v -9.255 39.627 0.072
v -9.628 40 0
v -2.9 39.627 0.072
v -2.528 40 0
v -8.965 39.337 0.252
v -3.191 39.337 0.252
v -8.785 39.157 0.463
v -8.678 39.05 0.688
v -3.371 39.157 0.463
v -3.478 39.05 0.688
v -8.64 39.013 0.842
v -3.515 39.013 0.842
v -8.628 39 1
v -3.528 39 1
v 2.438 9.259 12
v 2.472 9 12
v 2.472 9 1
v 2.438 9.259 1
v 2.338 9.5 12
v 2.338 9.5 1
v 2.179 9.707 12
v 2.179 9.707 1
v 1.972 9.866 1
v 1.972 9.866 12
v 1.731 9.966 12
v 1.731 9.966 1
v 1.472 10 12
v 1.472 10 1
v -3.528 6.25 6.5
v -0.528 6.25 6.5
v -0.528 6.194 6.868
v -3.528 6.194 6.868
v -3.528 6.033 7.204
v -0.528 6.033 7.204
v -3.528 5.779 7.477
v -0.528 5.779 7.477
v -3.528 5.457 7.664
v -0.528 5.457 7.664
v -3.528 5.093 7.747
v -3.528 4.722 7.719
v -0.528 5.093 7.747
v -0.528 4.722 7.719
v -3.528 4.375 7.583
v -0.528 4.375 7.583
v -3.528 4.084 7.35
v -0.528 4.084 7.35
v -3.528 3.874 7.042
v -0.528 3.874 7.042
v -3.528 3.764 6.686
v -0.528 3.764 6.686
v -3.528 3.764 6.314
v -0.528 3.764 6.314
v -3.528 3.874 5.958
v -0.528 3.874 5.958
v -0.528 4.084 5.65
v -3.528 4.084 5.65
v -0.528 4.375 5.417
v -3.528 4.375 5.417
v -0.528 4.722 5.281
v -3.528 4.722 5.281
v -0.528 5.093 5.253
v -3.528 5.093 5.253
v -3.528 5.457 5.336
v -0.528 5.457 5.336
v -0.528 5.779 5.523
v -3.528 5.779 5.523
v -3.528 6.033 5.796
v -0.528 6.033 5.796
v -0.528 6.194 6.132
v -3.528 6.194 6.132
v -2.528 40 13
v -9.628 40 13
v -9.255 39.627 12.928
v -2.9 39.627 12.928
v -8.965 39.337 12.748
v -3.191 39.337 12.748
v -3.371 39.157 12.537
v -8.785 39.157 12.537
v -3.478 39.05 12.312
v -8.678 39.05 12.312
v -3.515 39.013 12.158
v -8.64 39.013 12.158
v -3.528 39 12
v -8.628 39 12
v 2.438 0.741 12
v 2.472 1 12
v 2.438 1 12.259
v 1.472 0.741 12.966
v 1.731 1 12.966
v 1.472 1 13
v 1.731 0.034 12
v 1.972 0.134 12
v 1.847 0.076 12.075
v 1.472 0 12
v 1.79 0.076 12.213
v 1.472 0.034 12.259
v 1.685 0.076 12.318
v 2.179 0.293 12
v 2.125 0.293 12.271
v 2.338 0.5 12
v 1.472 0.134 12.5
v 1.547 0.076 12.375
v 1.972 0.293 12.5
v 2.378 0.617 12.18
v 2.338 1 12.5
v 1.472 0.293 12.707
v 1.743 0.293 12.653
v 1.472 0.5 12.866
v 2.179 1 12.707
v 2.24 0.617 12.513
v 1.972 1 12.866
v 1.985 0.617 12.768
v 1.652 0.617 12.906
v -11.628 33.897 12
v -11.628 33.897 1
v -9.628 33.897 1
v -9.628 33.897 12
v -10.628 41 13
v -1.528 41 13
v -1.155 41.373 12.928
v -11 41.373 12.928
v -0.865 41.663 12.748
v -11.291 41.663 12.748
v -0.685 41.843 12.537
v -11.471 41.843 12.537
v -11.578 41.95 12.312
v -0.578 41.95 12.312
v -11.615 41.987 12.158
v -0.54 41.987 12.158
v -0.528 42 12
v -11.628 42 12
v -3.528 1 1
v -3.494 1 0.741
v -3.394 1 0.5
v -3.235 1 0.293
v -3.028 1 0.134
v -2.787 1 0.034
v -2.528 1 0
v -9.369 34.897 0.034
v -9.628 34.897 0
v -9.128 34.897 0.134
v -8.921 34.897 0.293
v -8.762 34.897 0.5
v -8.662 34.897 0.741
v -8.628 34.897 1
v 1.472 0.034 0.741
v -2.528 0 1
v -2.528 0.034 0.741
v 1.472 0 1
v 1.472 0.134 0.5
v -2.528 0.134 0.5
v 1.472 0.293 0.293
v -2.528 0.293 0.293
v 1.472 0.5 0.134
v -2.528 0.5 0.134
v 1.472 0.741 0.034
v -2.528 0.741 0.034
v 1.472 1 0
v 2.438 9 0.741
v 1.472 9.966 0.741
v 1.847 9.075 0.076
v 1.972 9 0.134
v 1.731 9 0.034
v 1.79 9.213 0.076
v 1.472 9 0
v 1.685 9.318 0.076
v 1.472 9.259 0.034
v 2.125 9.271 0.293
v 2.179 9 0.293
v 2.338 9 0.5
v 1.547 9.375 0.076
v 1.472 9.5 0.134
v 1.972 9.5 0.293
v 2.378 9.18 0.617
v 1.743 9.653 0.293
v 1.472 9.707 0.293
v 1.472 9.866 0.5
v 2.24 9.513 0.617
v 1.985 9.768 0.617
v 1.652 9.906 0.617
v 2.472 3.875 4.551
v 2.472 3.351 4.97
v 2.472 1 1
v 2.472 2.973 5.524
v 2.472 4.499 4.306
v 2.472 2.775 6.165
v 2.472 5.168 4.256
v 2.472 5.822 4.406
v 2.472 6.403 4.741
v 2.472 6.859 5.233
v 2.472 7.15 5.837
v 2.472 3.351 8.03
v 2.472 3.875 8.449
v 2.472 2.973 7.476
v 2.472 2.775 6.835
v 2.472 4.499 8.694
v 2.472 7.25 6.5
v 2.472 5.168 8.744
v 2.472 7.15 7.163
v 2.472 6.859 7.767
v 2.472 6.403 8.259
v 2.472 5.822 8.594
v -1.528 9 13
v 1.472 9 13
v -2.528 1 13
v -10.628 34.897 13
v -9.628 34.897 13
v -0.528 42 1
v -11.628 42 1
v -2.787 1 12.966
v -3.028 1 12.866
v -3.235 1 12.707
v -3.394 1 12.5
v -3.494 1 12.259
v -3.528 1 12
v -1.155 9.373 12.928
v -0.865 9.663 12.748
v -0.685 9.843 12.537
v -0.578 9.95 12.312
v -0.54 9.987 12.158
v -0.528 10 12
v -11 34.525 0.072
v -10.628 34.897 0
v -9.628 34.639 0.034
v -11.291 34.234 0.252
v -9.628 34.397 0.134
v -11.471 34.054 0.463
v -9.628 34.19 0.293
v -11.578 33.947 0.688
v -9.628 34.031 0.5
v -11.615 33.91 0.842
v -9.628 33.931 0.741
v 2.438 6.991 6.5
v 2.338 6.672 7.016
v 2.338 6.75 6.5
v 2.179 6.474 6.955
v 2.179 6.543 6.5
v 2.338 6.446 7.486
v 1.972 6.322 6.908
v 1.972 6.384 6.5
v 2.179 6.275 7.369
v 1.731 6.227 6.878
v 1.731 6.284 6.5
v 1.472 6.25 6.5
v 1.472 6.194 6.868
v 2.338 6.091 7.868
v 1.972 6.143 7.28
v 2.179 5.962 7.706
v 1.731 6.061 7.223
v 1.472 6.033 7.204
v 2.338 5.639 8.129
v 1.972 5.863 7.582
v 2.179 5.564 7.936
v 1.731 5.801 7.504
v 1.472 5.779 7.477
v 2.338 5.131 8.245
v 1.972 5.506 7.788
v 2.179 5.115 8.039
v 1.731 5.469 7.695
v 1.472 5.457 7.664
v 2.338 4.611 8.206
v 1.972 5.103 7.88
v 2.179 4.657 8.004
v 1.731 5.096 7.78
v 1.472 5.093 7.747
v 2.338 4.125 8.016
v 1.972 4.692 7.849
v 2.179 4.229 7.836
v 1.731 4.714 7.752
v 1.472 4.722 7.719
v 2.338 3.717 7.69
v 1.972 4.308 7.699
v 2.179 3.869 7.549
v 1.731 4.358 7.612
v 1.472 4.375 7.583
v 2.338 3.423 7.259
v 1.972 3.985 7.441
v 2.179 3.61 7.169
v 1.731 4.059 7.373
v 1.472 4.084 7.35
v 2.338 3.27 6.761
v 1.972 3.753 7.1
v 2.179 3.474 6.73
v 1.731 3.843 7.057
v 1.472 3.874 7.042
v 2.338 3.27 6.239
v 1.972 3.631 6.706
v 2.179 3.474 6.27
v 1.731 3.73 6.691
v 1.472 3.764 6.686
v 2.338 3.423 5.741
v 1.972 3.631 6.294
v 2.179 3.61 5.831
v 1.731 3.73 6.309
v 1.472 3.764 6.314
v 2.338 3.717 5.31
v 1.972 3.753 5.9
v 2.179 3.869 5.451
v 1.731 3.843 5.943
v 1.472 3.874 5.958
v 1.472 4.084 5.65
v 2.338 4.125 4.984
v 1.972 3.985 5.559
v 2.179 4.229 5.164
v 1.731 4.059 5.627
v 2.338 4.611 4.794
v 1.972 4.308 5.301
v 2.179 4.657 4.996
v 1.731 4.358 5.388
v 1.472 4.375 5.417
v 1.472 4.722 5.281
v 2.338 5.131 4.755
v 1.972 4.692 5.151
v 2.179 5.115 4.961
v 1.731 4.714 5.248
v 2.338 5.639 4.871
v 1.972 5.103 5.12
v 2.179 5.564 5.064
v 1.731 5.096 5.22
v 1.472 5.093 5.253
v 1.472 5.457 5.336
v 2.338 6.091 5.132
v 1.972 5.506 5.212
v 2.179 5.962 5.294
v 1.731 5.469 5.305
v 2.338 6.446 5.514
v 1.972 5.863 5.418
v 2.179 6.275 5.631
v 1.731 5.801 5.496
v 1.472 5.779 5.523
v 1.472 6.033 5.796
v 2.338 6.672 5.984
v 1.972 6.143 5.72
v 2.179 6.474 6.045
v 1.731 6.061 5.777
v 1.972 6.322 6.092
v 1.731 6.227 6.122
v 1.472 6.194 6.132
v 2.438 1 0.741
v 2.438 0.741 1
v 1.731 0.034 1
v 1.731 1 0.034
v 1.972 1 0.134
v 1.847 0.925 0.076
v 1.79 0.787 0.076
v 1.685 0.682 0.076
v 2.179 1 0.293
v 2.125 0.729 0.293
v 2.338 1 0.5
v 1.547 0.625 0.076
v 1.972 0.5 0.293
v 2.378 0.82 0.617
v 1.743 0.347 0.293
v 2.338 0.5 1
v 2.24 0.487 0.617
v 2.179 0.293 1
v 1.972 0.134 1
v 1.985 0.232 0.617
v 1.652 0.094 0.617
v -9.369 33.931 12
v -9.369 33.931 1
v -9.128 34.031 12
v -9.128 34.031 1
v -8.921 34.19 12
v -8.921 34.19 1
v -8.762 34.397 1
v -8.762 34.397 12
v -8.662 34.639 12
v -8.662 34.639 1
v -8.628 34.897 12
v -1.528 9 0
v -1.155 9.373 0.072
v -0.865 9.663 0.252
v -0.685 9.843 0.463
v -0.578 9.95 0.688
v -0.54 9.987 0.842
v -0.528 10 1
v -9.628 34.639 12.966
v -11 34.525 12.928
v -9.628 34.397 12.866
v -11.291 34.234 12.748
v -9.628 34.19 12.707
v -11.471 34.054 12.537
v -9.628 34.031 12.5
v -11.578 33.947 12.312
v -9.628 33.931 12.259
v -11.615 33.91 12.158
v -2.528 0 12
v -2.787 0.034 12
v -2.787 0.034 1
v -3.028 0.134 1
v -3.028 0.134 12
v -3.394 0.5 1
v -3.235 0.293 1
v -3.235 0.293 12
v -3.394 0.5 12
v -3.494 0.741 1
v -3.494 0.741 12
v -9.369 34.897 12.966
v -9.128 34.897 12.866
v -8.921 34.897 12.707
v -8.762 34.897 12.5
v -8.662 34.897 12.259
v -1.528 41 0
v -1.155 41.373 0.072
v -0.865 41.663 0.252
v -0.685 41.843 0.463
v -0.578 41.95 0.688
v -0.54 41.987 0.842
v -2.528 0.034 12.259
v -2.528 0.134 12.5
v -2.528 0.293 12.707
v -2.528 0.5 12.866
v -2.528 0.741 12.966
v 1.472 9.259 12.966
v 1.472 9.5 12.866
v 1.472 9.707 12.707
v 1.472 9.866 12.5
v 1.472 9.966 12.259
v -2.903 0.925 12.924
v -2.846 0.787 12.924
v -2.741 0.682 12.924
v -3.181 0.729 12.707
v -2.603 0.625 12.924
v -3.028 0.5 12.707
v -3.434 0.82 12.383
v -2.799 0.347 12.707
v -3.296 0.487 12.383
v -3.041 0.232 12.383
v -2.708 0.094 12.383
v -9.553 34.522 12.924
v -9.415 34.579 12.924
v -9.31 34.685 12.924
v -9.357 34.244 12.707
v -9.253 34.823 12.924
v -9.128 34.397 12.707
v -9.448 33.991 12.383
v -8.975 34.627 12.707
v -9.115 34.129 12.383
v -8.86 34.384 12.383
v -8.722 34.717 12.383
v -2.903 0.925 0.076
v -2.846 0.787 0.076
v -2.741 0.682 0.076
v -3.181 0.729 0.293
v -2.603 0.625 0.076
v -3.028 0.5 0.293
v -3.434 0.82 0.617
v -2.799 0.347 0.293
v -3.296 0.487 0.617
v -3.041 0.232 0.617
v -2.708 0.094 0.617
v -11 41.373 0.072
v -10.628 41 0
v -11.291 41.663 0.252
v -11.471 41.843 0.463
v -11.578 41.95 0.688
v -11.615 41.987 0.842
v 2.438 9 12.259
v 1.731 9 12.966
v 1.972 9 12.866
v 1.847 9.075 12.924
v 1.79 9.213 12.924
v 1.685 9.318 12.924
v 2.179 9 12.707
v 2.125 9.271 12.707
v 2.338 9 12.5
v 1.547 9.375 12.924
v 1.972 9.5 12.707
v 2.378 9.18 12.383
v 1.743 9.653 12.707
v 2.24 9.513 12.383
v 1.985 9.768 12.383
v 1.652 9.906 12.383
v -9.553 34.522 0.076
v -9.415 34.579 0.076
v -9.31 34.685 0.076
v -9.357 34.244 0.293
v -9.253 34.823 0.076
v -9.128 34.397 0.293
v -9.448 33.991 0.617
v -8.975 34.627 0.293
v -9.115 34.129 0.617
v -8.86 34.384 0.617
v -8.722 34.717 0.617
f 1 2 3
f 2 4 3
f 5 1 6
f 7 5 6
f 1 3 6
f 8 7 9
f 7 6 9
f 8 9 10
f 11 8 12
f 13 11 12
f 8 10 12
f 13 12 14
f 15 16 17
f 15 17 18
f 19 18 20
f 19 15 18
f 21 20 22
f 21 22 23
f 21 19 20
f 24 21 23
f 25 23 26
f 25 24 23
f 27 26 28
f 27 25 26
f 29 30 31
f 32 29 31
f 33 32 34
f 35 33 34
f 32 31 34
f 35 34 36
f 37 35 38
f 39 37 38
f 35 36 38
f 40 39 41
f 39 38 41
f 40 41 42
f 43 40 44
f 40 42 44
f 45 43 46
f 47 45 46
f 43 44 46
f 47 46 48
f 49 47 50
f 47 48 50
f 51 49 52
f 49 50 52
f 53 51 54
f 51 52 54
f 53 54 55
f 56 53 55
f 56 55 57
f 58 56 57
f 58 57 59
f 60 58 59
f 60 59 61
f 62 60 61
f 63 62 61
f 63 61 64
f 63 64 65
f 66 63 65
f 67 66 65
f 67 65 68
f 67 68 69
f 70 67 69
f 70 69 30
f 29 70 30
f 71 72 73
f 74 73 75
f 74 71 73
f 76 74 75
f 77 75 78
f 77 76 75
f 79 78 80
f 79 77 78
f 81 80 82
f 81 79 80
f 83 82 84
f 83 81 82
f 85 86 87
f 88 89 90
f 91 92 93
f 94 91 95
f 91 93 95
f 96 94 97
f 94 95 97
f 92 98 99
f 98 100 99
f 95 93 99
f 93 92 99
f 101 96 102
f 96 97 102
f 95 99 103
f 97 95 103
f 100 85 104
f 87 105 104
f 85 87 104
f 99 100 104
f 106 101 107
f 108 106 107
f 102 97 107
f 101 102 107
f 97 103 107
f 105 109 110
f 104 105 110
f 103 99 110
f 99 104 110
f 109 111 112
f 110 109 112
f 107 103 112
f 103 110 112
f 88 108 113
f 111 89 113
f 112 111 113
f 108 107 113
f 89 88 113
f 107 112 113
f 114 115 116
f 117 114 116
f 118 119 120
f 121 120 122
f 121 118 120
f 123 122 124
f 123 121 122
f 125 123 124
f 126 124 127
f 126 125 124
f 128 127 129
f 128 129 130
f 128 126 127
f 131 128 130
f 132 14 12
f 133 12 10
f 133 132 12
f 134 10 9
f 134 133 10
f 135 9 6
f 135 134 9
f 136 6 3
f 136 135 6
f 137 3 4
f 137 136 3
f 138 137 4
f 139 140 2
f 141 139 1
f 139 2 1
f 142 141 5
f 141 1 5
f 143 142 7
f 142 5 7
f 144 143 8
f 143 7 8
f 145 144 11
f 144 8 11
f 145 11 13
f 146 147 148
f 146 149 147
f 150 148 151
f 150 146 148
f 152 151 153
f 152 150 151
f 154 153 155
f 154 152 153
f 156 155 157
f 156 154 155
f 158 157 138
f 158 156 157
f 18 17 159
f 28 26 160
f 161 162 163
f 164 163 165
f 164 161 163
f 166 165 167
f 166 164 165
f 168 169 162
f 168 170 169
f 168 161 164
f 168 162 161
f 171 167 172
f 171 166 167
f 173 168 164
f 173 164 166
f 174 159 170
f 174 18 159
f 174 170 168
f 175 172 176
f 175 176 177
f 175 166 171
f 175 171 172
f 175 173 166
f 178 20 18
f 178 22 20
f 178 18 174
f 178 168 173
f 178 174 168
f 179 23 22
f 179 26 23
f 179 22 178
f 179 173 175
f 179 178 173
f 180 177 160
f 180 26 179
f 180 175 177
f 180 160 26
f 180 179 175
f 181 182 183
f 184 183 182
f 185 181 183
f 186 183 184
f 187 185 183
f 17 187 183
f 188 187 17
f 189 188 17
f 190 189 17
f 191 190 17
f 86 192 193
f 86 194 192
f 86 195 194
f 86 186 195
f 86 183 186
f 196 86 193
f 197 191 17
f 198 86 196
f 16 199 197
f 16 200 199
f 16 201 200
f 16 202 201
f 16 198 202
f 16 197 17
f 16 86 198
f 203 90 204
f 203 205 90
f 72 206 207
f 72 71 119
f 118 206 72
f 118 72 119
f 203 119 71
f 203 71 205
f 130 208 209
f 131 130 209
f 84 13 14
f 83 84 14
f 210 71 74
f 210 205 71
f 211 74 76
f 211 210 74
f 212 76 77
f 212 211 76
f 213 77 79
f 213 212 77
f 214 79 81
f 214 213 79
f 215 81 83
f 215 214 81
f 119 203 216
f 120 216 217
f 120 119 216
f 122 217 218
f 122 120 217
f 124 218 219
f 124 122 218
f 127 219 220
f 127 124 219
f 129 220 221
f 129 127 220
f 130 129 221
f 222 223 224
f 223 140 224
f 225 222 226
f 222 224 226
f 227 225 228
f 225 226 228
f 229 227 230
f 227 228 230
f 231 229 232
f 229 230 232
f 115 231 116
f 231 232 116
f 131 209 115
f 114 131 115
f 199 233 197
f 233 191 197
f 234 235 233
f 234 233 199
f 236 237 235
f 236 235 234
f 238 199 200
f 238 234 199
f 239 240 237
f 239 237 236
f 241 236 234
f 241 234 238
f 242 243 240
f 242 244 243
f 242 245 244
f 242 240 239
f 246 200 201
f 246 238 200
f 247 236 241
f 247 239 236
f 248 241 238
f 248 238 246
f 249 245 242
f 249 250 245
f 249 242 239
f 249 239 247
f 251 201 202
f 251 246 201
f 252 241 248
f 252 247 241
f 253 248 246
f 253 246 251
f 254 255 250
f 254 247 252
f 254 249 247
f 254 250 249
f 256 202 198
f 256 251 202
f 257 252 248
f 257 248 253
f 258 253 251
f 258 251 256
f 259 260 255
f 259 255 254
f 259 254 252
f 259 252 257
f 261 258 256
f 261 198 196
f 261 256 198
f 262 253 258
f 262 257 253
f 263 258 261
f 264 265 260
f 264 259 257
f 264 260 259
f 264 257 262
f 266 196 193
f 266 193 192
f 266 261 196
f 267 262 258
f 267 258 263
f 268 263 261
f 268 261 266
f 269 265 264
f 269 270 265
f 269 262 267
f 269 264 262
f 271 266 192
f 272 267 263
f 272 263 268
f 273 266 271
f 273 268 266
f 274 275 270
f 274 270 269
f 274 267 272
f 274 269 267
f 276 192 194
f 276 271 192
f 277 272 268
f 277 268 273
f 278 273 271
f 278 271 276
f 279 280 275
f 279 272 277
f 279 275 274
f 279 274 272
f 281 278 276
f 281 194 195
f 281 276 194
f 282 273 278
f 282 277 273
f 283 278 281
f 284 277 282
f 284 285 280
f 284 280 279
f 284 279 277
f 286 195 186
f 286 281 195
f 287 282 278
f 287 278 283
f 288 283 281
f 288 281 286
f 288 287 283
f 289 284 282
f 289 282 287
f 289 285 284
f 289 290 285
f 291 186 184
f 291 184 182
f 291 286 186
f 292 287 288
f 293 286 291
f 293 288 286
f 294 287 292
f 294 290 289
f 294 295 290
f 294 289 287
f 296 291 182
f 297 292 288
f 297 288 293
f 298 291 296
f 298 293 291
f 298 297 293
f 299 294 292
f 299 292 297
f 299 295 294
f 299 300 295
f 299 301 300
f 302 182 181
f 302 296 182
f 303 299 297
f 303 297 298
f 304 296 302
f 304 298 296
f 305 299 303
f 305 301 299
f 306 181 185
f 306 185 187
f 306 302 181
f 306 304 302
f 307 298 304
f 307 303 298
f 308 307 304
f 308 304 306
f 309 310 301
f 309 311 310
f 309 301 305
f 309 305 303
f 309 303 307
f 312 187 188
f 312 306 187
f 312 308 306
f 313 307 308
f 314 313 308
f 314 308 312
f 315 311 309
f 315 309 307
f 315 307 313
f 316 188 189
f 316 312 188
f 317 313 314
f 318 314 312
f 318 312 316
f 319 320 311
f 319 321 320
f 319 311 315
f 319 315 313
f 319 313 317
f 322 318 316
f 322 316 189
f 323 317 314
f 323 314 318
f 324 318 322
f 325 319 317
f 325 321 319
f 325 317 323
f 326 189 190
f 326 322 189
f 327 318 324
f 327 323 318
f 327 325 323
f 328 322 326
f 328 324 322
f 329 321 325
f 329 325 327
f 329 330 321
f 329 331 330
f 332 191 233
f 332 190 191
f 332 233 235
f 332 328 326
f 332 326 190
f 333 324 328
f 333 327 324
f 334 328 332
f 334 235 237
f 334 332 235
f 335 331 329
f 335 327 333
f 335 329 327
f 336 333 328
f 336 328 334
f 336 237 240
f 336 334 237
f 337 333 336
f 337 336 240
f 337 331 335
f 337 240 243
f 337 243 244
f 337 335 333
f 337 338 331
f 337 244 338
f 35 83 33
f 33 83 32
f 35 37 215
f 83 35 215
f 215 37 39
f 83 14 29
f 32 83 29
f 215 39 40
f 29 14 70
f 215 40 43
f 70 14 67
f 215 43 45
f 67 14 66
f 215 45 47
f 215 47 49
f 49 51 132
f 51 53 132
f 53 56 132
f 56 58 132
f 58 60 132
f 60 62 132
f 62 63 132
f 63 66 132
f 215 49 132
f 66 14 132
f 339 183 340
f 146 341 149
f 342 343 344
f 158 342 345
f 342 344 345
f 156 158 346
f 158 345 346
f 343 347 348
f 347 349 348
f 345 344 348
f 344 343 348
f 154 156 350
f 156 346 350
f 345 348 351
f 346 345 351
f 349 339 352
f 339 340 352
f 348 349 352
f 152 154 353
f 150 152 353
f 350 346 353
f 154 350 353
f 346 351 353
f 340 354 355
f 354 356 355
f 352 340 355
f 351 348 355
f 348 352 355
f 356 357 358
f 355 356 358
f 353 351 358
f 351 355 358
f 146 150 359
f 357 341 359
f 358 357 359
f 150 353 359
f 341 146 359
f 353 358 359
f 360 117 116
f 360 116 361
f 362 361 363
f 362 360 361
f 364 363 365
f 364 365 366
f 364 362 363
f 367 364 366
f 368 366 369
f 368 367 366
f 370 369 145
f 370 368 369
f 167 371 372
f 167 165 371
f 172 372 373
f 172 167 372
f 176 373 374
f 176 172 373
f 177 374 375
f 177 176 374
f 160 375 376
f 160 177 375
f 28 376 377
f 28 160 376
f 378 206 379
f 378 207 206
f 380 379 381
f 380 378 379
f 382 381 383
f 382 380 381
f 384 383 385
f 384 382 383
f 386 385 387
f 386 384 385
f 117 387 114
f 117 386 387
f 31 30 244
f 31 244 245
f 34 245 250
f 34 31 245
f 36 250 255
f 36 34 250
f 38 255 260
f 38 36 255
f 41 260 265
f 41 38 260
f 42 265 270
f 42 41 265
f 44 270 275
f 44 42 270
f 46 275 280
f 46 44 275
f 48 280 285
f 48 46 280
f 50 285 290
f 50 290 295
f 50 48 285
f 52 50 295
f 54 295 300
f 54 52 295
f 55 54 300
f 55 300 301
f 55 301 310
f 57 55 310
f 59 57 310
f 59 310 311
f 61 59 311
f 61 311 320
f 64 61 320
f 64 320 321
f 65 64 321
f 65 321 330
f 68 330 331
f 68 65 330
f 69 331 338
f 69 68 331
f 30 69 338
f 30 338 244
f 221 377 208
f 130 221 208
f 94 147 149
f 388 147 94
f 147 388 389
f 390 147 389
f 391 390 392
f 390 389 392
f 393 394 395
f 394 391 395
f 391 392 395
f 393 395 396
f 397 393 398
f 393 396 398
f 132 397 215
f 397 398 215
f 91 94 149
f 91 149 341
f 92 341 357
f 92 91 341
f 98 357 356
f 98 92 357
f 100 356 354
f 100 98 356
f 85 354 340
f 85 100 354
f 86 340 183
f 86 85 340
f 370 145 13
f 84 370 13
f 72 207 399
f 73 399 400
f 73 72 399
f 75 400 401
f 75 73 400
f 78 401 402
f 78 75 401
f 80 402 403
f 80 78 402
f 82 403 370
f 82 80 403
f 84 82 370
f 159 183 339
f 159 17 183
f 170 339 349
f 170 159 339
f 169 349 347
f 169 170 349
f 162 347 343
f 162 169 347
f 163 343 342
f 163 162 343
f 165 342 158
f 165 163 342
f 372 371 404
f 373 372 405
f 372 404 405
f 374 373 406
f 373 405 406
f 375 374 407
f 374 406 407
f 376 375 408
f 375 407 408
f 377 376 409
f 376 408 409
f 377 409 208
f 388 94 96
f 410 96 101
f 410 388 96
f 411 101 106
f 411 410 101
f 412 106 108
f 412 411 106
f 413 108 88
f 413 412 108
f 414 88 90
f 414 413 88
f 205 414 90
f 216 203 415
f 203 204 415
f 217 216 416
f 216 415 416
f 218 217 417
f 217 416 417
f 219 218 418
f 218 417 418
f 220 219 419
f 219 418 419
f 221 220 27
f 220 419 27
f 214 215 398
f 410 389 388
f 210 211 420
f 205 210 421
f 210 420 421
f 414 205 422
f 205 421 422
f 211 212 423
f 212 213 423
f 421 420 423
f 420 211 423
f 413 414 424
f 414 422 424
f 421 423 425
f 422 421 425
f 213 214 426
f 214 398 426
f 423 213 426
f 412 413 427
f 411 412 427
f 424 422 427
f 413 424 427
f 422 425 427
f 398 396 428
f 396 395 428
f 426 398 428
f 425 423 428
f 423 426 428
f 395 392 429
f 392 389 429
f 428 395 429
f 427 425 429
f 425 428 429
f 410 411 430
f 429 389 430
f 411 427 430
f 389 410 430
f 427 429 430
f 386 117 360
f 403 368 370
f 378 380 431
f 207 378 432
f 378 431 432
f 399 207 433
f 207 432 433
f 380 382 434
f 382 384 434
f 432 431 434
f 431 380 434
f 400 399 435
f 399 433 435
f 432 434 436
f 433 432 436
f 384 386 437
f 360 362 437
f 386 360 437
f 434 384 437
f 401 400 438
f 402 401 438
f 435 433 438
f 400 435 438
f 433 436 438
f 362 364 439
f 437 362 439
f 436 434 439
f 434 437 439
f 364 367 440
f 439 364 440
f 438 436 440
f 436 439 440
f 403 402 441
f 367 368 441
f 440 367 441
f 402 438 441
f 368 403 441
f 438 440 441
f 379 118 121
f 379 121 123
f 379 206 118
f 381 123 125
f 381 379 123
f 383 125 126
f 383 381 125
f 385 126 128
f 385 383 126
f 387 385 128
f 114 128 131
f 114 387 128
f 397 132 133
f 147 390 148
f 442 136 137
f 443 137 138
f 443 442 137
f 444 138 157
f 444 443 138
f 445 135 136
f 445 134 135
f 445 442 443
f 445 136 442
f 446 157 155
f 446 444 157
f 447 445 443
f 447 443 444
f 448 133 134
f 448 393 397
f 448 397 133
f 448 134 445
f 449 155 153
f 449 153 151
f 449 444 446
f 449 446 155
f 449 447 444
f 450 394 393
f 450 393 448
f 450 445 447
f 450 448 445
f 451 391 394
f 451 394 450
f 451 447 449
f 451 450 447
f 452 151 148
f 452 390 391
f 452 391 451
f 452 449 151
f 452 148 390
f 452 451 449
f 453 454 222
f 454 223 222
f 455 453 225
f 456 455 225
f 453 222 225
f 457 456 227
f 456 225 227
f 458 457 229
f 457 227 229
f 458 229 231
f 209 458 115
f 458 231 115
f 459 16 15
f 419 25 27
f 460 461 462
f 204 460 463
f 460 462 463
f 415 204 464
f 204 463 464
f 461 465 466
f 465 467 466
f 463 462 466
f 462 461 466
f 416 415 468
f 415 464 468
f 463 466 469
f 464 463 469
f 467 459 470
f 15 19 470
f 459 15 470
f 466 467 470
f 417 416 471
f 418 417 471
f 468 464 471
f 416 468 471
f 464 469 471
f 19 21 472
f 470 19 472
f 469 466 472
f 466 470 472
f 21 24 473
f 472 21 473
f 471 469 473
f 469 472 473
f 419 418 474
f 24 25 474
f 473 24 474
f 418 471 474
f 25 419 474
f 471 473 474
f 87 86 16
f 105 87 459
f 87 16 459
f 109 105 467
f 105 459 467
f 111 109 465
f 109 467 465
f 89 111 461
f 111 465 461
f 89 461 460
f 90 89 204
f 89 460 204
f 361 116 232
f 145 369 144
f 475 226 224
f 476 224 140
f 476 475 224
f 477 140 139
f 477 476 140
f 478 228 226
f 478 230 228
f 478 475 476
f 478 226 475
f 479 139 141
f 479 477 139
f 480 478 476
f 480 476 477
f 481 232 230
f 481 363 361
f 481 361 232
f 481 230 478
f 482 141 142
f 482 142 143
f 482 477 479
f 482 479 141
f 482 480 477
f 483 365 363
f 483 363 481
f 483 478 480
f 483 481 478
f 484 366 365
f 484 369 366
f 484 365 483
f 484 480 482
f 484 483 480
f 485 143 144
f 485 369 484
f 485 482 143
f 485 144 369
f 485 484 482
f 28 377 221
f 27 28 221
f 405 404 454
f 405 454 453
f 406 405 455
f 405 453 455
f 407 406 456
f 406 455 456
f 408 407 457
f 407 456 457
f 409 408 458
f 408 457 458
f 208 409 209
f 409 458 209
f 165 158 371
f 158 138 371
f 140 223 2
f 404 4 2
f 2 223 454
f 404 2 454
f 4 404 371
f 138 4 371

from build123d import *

# Parameters (mm, degrees)
F1_DEPTH = 13
F2_W     = 10
F2_H     = 13
F2_R     = 1.25
F3_DEPTH = 3
F4_DEPTH = 25
F5_R     = 1


with BuildPart() as f1:
    # F0 (on Top) → F1 (new body)
    with BuildSketch(Plane.XY):
        Polygon((-11.62796, 33.897347), (-8.62796, 33.897347), (-8.62796, 39), (-3.52796, 39), (-3.52796, 0), (-0.52796, 0), (-0.52796, 42), (-11.62796, 42), align=None)
    extrude(amount=F1_DEPTH)

    # F2 (on face) → F3 (join)
    with BuildSketch(Plane.YZ.offset(-0.52796)):
        with Locations((5, 6.5)):
            Rectangle(F2_W, F2_H)
        with Locations((5, 6.5)):
            Circle(F2_R, mode=Mode.SUBTRACT)
    extrude(amount=F3_DEPTH)

    # F2 (on face) → F4 (cut)
    with BuildSketch(Plane.YZ.offset(-0.52796)):
        with Locations((5, 6.5)):
            Circle(F2_R)
    extrude(amount=-F4_DEPTH, mode=Mode.SUBTRACT)

    # F5
    f5_edges = [f1.edges().sort_by_distance(p)[0] for p in [
        (-8.62796, 33.897347, 6.5),
        (-3.52796, 0, 6.5),
        (2.47204, 10, 6.5),
        (2.47204, 5, 13),
        (2.47204, 0, 6.5),
        (2.47204, 5, 0),
        (2.47204, 3.75, 6.5),
        (-0.52796, 26, 13),
        (-6.07796, 42, 13),
        (-11.62796, 37.948674, 13),
        (-10.12796, 33.897347, 13),
        (-8.62796, 36.448674, 13),
        (-6.07796, 39, 13),
        (-3.52796, 19.5, 13),
        (-0.52796, 0, 13),
        (0.97204, 10, 13),
        (-6.07796, 42, 0),
        (-11.62796, 37.948674, 0),
        (-10.12796, 33.897347, 0),
        (-8.62796, 36.448674, 0),
        (-6.07796, 39, 0),
        (-3.52796, 19.5, 0),
        (-0.52796, 0, 0),
        (0.97204, 10, 0),
        (-0.52796, 26, 0),
    ]]
    fillet(f5_edges, radius=F5_R)


solid = f1.part
